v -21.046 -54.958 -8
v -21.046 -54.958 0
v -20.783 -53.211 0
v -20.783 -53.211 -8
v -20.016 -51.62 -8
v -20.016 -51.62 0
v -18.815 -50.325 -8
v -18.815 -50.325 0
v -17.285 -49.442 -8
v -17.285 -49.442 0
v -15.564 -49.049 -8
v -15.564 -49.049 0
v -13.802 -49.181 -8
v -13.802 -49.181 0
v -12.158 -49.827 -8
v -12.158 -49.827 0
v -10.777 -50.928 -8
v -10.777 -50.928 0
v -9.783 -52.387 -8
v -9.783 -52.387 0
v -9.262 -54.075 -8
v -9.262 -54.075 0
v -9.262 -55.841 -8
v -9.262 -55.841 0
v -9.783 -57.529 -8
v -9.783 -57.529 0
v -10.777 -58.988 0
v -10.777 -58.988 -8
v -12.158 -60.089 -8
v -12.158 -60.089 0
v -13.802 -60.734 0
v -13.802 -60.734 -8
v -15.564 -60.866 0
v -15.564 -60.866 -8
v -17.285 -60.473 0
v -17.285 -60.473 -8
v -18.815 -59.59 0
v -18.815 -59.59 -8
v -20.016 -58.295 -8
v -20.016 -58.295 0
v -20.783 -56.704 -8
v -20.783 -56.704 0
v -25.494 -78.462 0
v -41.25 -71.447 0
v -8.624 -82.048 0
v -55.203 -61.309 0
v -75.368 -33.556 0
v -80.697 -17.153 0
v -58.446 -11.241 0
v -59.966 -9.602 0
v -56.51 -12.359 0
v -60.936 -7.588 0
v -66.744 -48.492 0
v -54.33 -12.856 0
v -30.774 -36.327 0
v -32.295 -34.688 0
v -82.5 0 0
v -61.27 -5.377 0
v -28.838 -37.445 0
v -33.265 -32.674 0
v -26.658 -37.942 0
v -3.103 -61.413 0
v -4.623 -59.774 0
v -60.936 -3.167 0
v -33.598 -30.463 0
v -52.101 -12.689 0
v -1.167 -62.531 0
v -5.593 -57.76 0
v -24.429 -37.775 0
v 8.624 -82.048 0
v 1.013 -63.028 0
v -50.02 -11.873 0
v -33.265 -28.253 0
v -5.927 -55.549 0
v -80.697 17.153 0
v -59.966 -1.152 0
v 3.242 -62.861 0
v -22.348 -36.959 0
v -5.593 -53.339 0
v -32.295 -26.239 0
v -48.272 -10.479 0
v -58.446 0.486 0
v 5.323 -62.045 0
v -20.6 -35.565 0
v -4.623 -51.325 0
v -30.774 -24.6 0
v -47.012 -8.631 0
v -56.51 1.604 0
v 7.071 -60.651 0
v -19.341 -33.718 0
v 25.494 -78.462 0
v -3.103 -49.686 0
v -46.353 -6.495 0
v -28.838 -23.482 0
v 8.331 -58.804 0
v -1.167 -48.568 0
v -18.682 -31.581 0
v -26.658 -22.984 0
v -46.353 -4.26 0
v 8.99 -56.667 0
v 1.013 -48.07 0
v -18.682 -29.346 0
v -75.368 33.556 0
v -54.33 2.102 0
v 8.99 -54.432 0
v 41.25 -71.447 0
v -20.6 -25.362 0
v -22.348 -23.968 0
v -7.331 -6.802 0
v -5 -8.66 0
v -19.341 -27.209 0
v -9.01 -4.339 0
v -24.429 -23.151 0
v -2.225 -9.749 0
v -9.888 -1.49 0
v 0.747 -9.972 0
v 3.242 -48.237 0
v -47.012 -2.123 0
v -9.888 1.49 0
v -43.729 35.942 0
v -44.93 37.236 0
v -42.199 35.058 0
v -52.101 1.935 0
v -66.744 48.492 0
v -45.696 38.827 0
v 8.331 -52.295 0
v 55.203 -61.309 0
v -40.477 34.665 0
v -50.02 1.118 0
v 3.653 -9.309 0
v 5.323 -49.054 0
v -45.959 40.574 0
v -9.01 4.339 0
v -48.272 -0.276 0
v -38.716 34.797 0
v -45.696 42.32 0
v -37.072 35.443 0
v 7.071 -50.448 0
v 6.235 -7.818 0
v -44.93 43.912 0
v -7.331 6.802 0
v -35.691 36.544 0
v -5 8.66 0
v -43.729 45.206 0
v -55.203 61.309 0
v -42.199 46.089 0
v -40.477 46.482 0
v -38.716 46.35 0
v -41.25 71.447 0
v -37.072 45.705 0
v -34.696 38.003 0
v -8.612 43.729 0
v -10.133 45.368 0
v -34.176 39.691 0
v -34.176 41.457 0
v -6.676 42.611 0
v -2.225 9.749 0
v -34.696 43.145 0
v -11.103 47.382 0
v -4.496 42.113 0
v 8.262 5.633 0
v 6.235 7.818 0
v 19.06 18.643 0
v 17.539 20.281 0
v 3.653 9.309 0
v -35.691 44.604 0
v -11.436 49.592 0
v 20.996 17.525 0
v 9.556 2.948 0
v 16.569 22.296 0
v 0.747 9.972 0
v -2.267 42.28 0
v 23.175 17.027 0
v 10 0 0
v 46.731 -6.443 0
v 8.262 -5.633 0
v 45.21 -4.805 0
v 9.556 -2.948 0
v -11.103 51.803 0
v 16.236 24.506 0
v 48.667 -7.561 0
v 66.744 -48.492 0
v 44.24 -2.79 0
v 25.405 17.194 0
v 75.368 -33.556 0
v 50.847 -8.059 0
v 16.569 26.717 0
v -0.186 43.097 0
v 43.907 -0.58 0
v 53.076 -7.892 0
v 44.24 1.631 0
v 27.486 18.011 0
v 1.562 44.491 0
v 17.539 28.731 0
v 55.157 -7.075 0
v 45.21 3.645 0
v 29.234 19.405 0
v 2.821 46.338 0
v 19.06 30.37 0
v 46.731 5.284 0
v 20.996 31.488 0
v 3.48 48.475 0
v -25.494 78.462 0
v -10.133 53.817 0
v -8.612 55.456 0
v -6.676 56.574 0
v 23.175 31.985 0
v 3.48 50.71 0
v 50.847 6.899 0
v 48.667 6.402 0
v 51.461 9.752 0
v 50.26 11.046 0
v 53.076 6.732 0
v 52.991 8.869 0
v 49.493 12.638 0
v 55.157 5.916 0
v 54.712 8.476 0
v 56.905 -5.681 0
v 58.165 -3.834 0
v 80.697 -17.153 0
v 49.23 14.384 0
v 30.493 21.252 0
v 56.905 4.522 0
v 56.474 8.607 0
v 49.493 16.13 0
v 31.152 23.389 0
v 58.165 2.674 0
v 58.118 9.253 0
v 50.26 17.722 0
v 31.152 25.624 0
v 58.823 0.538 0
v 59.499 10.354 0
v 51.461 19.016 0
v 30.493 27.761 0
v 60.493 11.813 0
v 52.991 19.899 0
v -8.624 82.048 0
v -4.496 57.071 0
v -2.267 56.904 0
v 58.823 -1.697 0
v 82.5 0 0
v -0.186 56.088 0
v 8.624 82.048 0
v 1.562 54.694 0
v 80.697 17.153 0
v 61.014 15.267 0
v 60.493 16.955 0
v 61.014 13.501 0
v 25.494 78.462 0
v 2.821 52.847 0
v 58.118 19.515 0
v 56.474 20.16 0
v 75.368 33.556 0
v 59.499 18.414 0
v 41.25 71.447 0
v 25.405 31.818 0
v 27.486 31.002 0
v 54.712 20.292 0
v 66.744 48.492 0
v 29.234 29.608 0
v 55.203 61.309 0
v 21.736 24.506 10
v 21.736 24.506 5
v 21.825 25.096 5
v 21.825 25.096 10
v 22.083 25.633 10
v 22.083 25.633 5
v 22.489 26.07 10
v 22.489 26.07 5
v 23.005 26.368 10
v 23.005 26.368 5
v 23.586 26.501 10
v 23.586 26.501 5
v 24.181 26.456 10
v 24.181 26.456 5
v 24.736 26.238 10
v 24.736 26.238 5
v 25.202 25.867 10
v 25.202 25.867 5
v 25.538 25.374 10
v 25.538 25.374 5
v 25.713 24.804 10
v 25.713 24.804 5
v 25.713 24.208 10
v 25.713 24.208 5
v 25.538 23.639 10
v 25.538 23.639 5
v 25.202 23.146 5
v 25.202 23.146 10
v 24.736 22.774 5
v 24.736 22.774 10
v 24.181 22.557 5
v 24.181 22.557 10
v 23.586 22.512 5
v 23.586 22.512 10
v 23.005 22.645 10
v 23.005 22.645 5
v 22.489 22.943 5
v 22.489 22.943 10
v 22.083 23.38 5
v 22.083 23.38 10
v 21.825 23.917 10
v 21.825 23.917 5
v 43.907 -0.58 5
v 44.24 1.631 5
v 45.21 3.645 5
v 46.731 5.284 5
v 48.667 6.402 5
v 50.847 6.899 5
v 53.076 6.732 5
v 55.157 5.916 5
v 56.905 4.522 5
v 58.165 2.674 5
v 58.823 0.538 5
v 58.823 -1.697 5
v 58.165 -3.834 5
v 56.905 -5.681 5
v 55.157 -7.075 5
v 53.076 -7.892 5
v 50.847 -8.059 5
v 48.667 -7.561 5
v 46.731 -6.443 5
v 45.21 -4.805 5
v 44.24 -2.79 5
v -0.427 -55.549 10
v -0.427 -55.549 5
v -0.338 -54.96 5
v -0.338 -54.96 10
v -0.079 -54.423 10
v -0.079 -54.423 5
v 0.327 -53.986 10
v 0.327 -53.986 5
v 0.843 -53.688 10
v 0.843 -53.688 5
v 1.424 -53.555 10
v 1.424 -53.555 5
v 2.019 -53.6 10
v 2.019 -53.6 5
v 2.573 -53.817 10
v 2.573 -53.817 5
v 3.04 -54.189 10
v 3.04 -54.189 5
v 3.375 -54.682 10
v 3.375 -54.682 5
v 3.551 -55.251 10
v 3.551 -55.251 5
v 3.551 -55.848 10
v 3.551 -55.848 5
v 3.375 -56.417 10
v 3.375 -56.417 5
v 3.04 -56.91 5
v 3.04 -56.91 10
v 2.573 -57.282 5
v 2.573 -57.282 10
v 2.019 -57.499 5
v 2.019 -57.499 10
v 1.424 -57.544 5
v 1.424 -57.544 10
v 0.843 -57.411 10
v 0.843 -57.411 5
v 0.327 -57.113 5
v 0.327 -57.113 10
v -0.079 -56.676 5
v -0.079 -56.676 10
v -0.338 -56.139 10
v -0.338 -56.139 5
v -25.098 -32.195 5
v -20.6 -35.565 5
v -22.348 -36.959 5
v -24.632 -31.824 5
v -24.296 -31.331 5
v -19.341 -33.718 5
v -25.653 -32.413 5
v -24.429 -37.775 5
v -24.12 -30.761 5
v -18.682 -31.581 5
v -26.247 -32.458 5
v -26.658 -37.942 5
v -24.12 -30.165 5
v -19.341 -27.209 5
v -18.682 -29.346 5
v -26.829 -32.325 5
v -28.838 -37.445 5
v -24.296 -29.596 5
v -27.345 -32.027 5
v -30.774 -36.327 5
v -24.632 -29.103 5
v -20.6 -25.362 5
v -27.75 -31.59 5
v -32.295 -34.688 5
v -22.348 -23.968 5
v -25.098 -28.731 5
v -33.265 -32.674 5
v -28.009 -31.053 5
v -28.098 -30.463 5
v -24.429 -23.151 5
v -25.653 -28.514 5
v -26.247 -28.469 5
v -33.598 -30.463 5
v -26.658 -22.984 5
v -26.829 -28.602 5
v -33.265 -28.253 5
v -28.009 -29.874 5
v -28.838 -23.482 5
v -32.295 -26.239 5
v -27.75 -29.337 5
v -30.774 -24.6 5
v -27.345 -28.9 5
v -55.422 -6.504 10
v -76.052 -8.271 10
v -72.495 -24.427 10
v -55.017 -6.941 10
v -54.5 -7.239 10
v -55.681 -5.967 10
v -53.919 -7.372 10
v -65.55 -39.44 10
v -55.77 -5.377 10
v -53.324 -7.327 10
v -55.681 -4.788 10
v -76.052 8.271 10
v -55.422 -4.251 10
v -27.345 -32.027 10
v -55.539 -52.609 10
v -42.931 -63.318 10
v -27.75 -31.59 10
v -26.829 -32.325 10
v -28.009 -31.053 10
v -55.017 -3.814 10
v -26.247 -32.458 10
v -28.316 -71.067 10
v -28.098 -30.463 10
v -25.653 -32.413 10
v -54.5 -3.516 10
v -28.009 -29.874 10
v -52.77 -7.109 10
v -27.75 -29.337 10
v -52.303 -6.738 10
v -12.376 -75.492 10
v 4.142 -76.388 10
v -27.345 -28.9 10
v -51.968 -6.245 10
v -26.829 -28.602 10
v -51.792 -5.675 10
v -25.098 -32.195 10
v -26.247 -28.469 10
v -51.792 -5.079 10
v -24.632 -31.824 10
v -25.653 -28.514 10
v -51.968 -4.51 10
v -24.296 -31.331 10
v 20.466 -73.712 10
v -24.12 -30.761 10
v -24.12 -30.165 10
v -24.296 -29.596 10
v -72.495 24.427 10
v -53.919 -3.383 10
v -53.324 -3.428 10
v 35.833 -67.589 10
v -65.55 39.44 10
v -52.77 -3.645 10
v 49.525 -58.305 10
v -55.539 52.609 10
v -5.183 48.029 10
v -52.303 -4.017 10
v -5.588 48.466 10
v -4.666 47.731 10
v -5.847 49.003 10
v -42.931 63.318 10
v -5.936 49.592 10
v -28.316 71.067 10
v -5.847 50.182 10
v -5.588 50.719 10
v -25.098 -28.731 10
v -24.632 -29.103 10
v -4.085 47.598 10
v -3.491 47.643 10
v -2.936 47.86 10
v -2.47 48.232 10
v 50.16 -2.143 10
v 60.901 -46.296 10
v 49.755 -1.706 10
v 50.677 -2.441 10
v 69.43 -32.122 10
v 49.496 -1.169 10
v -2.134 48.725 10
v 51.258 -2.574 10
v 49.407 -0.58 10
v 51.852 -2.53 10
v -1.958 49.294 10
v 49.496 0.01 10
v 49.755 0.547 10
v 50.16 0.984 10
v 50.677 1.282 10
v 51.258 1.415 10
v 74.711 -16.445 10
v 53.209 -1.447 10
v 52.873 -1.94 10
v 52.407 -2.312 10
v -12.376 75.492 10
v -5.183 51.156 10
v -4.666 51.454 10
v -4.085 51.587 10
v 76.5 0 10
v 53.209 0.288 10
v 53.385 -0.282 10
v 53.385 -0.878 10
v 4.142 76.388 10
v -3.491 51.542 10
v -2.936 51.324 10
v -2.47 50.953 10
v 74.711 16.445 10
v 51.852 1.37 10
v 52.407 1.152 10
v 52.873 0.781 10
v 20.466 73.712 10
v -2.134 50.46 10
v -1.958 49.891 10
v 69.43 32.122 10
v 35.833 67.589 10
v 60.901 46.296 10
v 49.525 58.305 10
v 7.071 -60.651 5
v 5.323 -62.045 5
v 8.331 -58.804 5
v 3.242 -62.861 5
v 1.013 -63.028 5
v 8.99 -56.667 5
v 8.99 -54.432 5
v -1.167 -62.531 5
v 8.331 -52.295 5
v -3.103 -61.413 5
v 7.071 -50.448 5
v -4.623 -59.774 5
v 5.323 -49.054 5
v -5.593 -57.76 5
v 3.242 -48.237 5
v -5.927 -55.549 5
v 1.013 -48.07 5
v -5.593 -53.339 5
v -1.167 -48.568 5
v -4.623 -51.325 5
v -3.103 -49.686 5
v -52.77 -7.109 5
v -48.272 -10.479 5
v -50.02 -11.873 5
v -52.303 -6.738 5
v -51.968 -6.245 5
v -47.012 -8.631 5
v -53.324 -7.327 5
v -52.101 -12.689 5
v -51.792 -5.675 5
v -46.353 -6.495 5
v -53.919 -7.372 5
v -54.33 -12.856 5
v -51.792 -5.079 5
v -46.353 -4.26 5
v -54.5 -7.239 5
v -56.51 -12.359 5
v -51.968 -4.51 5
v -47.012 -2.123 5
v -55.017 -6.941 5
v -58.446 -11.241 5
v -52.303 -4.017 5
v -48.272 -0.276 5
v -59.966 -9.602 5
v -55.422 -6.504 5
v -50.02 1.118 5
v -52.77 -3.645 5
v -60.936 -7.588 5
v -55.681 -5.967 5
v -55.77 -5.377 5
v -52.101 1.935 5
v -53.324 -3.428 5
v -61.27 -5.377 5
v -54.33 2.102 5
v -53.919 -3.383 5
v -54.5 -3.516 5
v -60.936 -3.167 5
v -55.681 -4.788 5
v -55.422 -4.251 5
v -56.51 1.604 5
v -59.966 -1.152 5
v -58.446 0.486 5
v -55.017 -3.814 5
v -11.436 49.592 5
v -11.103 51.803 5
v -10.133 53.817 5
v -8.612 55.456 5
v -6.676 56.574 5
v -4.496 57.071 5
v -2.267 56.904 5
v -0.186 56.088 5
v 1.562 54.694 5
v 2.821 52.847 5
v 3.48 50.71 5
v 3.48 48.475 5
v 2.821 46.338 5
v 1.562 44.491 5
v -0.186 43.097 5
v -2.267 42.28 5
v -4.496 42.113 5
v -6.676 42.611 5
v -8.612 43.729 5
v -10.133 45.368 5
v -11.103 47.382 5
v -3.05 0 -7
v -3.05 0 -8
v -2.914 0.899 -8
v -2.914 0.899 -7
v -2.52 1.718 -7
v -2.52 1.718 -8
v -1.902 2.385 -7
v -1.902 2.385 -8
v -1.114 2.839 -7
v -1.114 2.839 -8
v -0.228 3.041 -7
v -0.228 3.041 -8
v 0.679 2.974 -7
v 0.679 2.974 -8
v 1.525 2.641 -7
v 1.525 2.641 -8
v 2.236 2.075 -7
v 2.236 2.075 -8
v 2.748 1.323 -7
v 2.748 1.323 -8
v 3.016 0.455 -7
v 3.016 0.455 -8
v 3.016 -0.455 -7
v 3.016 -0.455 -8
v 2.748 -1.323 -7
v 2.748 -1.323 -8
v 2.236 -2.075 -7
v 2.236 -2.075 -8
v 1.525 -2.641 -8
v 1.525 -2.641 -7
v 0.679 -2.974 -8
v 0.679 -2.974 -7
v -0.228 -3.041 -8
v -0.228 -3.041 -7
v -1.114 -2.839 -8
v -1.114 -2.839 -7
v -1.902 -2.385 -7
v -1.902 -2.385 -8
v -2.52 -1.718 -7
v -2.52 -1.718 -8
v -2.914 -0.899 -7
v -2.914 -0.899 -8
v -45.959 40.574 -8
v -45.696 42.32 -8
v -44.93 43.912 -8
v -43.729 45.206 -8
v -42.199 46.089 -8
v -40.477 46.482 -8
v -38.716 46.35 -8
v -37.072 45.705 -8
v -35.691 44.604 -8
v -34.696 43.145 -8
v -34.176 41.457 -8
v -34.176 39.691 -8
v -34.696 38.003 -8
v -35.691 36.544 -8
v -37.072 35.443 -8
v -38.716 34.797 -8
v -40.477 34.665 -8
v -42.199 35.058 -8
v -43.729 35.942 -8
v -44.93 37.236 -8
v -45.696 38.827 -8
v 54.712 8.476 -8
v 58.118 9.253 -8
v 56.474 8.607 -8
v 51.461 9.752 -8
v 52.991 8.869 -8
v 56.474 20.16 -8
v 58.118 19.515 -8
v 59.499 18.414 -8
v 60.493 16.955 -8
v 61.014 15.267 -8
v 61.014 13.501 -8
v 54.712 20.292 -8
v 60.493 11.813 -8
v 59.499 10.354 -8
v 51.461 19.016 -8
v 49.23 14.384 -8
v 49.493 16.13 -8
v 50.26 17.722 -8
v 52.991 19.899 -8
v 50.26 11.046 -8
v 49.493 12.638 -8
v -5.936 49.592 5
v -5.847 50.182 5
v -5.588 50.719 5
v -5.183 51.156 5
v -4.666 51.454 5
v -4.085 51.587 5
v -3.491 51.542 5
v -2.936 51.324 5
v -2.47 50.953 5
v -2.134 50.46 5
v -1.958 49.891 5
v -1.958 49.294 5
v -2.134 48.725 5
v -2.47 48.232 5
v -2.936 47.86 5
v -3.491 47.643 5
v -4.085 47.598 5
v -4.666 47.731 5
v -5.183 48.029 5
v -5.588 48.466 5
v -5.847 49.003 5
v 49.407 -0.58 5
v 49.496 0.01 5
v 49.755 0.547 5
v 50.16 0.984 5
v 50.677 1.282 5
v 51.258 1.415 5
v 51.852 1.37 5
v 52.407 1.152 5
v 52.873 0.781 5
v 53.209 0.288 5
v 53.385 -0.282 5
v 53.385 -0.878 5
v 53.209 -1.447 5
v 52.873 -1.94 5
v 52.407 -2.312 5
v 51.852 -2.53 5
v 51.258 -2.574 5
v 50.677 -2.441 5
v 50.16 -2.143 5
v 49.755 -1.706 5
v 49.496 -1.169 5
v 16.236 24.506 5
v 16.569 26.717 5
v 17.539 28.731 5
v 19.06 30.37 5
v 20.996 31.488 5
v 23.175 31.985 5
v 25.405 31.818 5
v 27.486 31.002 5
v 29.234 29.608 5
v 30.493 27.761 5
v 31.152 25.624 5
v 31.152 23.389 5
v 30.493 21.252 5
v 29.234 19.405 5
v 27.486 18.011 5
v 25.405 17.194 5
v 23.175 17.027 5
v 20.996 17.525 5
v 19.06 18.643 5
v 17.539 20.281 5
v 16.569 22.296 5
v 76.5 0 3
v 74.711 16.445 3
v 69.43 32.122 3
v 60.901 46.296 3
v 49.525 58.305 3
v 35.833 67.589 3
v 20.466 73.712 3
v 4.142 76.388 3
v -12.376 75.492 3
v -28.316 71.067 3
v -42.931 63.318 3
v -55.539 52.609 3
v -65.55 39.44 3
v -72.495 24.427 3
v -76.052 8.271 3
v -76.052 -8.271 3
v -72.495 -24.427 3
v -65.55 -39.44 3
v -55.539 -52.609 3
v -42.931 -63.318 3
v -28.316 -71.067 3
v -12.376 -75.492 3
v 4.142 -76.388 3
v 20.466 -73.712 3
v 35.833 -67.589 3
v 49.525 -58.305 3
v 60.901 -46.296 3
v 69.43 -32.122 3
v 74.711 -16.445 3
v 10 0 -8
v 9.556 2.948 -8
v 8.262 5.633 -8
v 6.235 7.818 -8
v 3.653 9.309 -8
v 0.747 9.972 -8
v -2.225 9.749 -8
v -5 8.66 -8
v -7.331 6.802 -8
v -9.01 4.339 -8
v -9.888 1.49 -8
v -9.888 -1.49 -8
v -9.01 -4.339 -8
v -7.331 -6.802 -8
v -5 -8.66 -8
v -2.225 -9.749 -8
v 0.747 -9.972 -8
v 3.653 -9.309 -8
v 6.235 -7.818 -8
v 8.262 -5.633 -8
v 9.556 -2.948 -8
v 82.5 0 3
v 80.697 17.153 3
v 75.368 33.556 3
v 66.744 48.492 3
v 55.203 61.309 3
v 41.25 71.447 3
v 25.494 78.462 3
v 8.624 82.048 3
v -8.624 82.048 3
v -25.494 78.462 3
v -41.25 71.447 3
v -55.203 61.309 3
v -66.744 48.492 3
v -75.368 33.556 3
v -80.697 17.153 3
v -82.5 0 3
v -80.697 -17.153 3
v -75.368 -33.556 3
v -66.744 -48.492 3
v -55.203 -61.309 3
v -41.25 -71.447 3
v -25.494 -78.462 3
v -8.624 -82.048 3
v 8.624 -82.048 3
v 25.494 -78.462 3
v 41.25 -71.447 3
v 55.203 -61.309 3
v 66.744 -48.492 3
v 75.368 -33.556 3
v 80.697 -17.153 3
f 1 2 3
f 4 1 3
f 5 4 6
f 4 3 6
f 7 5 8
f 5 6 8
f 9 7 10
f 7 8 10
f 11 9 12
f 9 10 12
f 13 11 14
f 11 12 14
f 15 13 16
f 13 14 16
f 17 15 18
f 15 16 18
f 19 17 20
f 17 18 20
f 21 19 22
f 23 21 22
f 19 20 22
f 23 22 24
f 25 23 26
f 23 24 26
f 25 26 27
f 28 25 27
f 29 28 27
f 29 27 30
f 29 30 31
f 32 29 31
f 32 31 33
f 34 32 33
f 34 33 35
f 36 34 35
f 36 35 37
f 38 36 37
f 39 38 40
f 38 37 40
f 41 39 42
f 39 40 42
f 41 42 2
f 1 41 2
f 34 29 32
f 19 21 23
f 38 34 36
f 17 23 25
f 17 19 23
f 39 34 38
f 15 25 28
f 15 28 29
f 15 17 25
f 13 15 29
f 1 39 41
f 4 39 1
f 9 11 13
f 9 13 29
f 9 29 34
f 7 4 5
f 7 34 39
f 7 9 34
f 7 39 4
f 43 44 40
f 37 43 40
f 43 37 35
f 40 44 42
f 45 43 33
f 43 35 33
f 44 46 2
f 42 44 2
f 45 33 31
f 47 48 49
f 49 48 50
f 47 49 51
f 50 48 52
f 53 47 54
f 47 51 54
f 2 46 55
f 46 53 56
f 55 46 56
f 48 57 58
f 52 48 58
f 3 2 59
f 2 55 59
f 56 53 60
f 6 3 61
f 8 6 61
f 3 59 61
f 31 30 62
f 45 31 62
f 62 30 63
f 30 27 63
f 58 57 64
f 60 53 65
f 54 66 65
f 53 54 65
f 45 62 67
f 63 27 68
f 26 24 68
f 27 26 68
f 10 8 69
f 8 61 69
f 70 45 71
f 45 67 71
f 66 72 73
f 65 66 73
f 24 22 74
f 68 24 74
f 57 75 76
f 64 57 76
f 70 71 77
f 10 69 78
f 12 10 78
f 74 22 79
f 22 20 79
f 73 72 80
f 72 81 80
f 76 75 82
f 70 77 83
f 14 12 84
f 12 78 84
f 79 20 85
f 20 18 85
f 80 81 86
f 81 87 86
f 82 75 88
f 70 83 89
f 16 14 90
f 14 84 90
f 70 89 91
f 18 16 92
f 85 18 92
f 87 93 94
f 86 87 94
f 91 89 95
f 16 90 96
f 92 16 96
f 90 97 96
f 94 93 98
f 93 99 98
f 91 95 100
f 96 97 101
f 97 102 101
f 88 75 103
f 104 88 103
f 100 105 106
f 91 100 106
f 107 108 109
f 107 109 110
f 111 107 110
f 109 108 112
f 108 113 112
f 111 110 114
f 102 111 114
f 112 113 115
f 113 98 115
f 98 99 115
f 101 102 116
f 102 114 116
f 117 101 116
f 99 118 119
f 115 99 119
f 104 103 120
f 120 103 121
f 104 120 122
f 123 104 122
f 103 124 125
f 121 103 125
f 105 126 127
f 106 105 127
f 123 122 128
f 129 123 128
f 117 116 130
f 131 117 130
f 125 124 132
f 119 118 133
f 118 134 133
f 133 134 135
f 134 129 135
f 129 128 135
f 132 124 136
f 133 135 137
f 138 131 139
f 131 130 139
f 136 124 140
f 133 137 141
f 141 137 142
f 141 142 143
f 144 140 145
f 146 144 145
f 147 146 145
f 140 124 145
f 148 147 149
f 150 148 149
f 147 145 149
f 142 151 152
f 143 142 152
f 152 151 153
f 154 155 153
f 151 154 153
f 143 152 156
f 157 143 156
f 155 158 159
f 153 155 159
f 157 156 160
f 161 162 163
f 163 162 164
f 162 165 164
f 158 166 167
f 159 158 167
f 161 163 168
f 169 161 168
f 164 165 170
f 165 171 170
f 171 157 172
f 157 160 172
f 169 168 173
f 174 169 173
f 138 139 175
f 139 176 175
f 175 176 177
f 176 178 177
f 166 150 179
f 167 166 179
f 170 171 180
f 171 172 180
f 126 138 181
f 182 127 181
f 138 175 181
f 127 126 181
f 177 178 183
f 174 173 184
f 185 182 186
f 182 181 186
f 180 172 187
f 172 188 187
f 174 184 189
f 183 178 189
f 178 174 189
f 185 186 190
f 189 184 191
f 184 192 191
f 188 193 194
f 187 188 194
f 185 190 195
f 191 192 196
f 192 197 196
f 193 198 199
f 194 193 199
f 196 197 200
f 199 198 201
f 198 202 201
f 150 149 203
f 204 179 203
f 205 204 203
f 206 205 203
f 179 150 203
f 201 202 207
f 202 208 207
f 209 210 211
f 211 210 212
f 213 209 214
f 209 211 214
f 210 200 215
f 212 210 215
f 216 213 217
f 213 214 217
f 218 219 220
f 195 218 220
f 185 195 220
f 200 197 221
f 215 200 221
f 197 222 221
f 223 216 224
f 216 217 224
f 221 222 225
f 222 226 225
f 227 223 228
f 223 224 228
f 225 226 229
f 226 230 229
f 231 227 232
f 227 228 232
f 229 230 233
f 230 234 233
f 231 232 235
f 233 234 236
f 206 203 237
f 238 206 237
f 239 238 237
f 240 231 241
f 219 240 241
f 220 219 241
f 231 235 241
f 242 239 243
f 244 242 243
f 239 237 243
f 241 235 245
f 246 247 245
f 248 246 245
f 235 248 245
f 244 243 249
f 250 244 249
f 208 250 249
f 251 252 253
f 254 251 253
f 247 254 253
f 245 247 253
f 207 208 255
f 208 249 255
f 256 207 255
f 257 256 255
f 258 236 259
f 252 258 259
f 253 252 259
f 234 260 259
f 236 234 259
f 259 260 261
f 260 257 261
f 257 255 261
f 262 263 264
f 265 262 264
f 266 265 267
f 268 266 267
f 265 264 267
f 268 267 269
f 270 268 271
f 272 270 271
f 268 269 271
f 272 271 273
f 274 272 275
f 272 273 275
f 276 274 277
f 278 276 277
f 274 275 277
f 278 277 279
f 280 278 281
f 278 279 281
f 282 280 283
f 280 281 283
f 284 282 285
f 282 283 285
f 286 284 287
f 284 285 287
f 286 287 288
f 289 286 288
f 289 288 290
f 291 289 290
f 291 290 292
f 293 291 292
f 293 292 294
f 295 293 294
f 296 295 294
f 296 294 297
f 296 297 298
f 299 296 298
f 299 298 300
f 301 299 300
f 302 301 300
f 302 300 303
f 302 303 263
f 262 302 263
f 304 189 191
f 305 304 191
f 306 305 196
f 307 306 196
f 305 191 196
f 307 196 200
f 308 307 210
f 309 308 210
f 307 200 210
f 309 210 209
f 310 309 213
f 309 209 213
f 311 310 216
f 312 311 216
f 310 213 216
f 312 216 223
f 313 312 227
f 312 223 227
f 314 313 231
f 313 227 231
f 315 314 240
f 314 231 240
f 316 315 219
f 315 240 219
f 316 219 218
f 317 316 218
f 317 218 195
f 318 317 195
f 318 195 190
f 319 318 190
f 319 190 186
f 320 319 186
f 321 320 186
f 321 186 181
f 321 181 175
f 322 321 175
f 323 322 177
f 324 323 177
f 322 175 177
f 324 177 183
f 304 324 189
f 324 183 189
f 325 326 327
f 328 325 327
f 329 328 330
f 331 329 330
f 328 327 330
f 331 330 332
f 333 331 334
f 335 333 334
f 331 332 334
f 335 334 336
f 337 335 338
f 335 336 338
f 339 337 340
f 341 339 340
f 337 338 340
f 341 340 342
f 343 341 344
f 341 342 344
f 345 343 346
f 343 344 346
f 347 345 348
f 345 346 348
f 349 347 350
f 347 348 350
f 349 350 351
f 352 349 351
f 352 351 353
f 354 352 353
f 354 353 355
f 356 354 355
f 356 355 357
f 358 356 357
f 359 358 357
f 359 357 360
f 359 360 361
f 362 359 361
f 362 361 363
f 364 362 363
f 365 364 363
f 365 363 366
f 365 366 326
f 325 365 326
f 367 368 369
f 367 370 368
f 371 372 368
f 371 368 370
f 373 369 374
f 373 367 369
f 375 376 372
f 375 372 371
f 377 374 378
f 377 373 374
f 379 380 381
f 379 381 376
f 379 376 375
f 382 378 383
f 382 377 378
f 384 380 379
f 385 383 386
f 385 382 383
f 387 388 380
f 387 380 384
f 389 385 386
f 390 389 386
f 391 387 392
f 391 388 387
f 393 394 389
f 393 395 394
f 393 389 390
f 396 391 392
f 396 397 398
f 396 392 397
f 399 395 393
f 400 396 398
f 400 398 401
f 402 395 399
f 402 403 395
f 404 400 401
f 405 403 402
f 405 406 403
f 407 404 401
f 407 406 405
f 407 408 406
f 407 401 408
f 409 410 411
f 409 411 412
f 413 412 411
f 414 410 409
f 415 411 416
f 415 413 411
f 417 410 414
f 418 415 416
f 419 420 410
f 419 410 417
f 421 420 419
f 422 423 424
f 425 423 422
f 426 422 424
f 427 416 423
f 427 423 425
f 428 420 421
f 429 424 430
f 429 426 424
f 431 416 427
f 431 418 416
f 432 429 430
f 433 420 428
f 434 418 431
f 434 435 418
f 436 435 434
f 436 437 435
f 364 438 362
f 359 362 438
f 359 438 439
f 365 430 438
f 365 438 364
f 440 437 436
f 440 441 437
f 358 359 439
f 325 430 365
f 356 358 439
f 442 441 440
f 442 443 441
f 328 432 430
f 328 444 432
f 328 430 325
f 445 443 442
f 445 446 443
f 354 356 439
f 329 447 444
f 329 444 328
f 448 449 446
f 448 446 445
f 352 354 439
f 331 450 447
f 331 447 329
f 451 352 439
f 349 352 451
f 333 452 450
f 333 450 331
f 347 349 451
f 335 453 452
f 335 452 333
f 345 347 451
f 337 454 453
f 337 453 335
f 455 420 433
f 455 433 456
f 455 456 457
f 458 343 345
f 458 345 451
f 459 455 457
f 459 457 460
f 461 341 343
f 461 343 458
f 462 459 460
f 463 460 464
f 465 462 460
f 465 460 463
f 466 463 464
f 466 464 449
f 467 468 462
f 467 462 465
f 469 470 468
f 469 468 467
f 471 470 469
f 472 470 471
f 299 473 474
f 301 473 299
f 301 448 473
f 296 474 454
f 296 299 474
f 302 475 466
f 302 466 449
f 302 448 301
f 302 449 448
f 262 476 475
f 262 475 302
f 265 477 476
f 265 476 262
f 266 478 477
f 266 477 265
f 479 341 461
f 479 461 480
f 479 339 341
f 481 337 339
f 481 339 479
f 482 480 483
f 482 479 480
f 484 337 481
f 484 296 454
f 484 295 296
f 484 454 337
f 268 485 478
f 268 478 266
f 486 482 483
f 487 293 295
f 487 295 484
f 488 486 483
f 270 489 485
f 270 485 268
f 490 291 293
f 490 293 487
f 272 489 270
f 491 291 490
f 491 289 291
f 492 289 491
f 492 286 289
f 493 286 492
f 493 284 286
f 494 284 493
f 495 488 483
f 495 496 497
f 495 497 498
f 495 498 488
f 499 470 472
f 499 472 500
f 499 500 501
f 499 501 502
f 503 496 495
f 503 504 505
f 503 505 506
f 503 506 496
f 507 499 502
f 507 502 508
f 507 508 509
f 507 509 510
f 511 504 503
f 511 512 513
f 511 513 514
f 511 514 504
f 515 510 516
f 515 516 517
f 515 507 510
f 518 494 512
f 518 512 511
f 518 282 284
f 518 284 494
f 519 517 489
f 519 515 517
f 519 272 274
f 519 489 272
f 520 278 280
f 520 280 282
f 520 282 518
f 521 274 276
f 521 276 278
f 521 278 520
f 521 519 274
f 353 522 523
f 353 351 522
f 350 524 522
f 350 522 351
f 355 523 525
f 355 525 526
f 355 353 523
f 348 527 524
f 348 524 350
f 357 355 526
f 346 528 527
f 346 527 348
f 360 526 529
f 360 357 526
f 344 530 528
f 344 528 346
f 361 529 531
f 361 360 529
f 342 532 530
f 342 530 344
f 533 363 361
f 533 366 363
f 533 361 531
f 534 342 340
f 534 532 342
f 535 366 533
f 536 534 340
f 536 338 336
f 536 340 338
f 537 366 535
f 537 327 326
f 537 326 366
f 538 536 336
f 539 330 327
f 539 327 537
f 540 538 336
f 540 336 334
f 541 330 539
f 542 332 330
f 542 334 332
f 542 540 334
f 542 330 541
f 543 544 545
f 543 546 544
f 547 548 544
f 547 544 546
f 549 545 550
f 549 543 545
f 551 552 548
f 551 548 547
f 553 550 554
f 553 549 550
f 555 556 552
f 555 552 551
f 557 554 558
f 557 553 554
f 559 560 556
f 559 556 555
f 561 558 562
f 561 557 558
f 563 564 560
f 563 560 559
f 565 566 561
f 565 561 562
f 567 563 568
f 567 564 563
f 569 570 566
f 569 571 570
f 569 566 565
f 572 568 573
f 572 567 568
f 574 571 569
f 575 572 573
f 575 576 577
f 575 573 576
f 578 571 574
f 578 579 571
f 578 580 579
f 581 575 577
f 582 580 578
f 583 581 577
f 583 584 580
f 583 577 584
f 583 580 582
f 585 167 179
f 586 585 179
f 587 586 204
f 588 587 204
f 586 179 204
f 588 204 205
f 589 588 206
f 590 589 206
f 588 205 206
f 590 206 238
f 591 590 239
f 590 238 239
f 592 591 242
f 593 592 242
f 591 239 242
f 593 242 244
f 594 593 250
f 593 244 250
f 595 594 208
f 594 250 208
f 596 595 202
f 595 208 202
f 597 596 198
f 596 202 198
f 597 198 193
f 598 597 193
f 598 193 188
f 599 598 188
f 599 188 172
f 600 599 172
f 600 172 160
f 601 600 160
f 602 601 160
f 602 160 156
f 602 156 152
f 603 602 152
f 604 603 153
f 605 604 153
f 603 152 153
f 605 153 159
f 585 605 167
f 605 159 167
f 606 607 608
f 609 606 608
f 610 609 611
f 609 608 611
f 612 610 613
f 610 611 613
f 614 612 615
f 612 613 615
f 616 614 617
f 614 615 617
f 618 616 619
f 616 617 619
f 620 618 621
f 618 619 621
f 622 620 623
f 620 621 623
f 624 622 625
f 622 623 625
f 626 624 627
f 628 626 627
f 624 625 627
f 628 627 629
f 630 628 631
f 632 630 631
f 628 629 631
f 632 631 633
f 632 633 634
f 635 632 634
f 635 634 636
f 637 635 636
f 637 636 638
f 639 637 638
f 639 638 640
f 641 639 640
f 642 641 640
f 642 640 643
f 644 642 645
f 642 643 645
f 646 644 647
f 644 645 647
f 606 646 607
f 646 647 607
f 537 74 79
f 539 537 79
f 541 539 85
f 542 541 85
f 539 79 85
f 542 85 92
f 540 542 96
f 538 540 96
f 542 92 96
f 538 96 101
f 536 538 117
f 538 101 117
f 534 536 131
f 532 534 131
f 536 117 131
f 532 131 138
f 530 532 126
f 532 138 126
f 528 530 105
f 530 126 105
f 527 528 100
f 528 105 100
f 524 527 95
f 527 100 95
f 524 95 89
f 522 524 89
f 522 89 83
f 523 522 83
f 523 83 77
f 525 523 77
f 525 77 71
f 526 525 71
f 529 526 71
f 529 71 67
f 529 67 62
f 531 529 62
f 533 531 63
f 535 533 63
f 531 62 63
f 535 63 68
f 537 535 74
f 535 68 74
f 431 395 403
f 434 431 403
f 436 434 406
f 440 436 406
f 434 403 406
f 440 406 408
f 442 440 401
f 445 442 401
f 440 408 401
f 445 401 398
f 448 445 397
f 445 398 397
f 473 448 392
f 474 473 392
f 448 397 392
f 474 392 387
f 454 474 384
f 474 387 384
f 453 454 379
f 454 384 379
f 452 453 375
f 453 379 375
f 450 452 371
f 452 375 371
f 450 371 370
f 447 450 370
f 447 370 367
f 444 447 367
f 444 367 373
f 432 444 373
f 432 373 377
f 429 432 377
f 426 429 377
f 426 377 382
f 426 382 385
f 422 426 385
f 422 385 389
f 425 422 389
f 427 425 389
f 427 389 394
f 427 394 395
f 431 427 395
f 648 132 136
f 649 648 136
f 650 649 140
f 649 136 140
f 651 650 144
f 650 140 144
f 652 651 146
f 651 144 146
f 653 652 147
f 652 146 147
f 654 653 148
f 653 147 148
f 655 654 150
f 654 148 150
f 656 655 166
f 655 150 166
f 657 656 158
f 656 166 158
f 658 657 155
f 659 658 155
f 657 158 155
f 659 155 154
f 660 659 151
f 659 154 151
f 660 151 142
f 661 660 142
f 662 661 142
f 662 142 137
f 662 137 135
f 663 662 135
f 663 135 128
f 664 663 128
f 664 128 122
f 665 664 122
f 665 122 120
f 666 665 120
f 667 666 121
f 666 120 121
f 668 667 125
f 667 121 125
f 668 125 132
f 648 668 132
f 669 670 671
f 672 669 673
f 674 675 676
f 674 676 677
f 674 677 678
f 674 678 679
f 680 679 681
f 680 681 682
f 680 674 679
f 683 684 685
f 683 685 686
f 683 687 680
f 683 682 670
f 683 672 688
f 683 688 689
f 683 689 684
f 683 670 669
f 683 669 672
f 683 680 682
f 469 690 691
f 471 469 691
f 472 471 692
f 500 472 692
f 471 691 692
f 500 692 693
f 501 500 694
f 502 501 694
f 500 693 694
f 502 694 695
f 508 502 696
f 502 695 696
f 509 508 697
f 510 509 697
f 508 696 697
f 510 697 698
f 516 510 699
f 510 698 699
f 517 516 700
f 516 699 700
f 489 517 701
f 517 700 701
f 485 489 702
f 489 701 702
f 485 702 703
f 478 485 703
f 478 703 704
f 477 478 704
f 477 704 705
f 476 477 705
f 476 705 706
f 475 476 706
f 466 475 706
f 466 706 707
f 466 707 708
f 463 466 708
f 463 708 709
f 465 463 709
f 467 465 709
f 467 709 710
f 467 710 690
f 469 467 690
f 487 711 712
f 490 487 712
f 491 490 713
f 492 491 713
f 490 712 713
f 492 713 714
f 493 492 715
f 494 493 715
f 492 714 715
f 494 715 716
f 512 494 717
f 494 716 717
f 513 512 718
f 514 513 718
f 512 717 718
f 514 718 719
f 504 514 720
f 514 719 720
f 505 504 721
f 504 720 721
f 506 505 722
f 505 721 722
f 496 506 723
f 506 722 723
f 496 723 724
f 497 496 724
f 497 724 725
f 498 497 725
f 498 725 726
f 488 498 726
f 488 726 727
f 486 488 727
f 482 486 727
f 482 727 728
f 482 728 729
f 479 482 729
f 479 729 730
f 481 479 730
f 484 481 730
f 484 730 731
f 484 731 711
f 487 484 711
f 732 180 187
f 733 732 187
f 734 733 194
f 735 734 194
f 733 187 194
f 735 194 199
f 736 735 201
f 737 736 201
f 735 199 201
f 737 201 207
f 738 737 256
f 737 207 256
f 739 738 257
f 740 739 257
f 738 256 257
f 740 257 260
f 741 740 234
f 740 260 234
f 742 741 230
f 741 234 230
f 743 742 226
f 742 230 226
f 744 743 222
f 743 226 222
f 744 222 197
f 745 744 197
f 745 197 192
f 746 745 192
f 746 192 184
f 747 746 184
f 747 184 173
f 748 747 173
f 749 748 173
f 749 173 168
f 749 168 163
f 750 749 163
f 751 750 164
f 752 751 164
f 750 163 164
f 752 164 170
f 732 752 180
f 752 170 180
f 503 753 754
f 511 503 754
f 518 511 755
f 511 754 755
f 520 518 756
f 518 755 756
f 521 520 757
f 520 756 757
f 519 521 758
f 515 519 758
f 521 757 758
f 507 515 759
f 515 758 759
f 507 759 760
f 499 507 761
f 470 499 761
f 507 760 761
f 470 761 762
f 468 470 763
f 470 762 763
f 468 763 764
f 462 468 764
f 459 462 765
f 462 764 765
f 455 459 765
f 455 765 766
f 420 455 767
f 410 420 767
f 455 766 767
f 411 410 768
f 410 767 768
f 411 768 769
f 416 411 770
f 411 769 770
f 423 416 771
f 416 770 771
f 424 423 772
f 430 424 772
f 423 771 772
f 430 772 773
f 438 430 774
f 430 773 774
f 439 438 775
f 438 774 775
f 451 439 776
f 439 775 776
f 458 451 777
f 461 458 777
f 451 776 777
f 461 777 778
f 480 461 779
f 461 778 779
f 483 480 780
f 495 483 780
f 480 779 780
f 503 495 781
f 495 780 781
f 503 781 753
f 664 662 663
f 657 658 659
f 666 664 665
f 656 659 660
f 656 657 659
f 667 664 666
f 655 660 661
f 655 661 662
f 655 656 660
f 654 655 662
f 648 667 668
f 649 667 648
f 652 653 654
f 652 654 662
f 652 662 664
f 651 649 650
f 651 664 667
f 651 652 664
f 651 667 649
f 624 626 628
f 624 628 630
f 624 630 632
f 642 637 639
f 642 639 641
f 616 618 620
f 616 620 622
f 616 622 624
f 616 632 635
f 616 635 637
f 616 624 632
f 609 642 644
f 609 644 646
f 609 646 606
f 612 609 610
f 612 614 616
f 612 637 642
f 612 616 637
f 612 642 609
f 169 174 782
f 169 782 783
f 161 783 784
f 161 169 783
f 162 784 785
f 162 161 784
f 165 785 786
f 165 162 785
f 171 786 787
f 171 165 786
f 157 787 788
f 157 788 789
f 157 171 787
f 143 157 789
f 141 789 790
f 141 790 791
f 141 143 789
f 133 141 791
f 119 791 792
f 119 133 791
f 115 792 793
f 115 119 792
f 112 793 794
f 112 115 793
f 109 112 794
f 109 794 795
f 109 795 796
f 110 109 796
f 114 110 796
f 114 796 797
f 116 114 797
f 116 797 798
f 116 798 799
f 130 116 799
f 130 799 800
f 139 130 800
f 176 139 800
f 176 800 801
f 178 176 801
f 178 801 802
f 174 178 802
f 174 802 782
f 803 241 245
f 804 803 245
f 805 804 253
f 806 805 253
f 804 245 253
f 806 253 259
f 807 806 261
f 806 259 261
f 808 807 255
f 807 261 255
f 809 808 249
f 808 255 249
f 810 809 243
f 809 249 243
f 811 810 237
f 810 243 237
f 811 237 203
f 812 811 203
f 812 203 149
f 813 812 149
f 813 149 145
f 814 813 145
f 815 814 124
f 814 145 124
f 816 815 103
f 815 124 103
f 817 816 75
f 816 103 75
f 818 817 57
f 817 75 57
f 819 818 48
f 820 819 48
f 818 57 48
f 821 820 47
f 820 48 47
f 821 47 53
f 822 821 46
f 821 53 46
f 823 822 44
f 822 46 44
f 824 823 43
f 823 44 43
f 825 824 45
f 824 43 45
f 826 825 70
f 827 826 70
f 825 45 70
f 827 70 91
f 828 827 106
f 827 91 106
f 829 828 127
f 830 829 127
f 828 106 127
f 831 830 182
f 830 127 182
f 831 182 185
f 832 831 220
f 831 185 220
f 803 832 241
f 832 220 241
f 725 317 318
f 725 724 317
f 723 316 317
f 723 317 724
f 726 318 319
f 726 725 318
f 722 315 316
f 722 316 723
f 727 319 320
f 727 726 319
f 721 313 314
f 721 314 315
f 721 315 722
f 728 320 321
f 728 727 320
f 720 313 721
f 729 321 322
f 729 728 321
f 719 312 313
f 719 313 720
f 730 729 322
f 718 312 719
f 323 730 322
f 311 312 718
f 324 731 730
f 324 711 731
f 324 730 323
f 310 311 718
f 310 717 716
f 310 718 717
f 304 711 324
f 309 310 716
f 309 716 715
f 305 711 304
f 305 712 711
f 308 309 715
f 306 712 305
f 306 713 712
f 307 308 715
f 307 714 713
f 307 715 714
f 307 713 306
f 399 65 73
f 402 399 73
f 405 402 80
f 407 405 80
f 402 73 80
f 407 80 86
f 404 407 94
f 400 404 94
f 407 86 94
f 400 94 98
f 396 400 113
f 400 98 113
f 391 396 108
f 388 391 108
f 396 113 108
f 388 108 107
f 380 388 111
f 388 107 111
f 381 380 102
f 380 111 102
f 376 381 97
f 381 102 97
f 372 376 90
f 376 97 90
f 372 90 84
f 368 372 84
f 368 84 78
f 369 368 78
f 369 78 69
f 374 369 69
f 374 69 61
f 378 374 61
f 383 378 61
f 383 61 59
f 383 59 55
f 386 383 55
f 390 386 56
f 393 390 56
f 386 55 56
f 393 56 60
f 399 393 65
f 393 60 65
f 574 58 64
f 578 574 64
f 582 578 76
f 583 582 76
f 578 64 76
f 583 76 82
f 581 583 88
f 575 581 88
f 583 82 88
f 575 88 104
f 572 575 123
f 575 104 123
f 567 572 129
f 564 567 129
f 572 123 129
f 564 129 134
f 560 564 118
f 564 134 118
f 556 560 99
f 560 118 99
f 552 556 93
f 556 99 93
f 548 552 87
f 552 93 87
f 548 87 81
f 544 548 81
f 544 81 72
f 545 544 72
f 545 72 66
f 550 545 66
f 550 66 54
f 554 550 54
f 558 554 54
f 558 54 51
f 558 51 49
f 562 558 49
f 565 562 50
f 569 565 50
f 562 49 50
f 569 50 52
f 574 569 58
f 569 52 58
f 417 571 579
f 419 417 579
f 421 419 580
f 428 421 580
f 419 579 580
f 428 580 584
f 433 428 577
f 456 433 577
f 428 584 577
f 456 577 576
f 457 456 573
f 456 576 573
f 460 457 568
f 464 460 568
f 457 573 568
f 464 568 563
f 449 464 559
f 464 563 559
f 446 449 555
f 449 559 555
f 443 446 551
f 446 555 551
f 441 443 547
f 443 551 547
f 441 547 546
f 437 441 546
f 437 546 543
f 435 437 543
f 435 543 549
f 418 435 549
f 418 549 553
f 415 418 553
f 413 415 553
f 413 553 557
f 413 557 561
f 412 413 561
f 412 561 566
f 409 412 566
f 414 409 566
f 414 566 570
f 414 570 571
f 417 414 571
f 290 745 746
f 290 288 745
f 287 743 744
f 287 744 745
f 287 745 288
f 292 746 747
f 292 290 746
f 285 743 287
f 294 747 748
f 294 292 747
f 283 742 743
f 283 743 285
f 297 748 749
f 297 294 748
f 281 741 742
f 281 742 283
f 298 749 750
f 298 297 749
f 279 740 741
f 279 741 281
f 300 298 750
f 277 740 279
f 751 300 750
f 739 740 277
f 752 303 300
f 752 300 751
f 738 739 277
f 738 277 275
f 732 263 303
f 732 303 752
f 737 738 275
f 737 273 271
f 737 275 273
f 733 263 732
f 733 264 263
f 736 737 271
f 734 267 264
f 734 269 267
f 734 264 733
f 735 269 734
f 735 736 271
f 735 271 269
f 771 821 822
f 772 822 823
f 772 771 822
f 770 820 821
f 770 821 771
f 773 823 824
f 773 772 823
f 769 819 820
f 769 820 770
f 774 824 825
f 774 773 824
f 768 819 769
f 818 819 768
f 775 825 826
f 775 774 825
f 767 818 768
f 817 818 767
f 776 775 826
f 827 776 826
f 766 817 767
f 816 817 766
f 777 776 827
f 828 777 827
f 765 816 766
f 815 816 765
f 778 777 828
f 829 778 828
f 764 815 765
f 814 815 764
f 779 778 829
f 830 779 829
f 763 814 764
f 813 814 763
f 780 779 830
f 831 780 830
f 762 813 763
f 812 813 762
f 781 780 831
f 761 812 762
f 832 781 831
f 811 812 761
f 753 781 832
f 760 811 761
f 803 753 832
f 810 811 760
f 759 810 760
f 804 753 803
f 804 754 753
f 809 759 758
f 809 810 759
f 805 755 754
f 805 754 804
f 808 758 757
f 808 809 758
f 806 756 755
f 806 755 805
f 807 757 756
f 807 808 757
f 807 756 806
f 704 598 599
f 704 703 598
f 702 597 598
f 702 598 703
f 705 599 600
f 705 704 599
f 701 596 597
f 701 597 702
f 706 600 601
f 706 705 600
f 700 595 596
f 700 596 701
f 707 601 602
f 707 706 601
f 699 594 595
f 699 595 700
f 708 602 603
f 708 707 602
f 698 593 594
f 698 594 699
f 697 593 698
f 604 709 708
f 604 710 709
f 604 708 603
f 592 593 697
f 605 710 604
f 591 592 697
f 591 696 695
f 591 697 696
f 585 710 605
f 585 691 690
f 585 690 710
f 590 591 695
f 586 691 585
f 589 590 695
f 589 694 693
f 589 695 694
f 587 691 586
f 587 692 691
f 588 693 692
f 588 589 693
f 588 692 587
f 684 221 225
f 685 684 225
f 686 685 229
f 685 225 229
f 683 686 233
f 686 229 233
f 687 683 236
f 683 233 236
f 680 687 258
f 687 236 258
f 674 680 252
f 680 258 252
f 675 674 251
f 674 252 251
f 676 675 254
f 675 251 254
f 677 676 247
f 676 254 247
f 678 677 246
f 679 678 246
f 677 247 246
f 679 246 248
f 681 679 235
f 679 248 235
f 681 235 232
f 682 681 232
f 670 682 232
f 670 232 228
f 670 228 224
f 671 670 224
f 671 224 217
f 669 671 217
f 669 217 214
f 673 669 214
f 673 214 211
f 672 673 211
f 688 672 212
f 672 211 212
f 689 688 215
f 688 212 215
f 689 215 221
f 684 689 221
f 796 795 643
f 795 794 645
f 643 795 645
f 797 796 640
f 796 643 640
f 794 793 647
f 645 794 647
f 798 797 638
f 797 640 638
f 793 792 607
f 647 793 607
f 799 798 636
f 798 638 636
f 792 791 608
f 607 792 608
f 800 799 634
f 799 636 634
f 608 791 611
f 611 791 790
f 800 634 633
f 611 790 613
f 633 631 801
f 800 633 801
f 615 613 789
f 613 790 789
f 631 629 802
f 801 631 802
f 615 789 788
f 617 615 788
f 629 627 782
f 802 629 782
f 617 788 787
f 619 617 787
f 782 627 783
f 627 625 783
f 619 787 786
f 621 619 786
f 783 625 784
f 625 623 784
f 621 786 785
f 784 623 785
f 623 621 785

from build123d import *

# Parameters (mm, degrees)
ESBO_O1_R                = 82.5
ESBO_O1_R_2              = 14
RESSALTO_EXTRUS_O1_DEPTH = 3
ESBO_O2_R                = 5.925
RESSALTO_EXTRUS_O2_DEPTH = 8
ESBO_O3_R                = 14
RESSALTO_EXTRUS_O3_DEPTH = 3
ESBO_O4_R                = 10
RESSALTO_EXTRUS_O4_DEPTH = 11
ESBO_O5_R                = 3.05
CORTE_EXTRUS_O1_DEPTH    = 1
ESBO_O6_R                = 76.5
RESSALTO_EXTRUS_O5_DEPTH = 7
ESBO_O13_R               = 2
CORTE_EXTRUS_O2_DEPTH    = 11
ESBO_O14_R               = 7.5
CORTE_EXTRUS_O3_DEPTH    = 5


with BuildPart() as part:
    # Esboço1 → Ressalto-extrusão1 (new body)
    with BuildSketch(Plane.XY):
        Circle(ESBO_O1_R)
        Circle(ESBO_O1_R_2, mode=Mode.SUBTRACT)
    extrude(amount=RESSALTO_EXTRUS_O1_DEPTH)

    # Esboço2 → Ressalto-extrusão2 (add)
    with BuildSketch(Plane(origin=(0, 0, 0), x_dir=(-1, 0, 0), z_dir=(0, 0, -1))):
        with Locations((-55.155254038, 14.383947721)):
            Circle(ESBO_O2_R)
        with Locations((40.034491152, 40.573877288)):
            Circle(ESBO_O2_R)
        with Locations((15.120762886, -54.957825009)):
            Circle(ESBO_O2_R)
    extrude(amount=RESSALTO_EXTRUS_O2_DEPTH)

    # Esboço3 → Ressalto-extrusão3 (add)
    with BuildSketch(Plane.XY.offset(3)):
        Circle(ESBO_O3_R)
    extrude(amount=-RESSALTO_EXTRUS_O3_DEPTH)

    # Esboço4 → Ressalto-extrusão4 (add)
    with BuildSketch(Plane.XY.offset(3)):
        Circle(ESBO_O4_R)
    extrude(amount=-RESSALTO_EXTRUS_O4_DEPTH)

    # Esboço5 → Corte-extrusão1 (cut)
    with BuildSketch(Plane(origin=(0, 0, -8), x_dir=(-1, 0, 0), z_dir=(0, 0, -1))):
        Circle(ESBO_O5_R)
    extrude(amount=-CORTE_EXTRUS_O1_DEPTH, mode=Mode.SUBTRACT)

    # Esboço6 → Ressalto-extrusão5 (add)
    with BuildSketch(Plane.XY.offset(3)):
        Circle(ESBO_O6_R)
    extrude(amount=RESSALTO_EXTRUS_O5_DEPTH)

    # Esboço13 → Corte-extrusão2 (cut, through all)
    with BuildSketch(Plane(origin=(0, 0, 0), x_dir=(-1, 0, 0), z_dir=(0, 0, -1))):
        with Locations((-1.573494017, -55.549458165)):
            Circle(ESBO_O13_R)
        with Locations((26.098018566, -30.463408429)):
            Circle(ESBO_O13_R)
        with Locations((53.76953115, -5.377358693)):
            Circle(ESBO_O13_R)
        with Locations((-51.407244113, -0.579653936)):
            Circle(ESBO_O13_R)
        with Locations((-23.73573153, 24.5063958)):
            Circle(ESBO_O13_R)
        with Locations((3.935781053, 49.592445536)):
            Circle(ESBO_O13_R)
    extrude(amount=-CORTE_EXTRUS_O2_DEPTH, mode=Mode.SUBTRACT)

    # Esboço14 → Corte-extrusão3 (cut)
    with BuildSketch(Plane(origin=(0, 0, 0), x_dir=(-1, 0, 0), z_dir=(0, 0, -1))):
        with Locations((53.76953115, -5.377358693)):
            Circle(ESBO_O14_R)
        with Locations((26.098018566, -30.463408429)):
            Circle(ESBO_O14_R)
        with Locations((-1.573494017, -55.549458165)):
            Circle(ESBO_O14_R)
        with Locations((3.935781053, 49.592445536)):
            Circle(ESBO_O14_R)
        with Locations((-23.73573153, 24.5063958)):
            Circle(ESBO_O14_R)
        with Locations((-51.407244113, -0.579653936)):
            Circle(ESBO_O14_R)
    extrude(amount=-CORTE_EXTRUS_O3_DEPTH, mode=Mode.SUBTRACT)


solid = part.part
